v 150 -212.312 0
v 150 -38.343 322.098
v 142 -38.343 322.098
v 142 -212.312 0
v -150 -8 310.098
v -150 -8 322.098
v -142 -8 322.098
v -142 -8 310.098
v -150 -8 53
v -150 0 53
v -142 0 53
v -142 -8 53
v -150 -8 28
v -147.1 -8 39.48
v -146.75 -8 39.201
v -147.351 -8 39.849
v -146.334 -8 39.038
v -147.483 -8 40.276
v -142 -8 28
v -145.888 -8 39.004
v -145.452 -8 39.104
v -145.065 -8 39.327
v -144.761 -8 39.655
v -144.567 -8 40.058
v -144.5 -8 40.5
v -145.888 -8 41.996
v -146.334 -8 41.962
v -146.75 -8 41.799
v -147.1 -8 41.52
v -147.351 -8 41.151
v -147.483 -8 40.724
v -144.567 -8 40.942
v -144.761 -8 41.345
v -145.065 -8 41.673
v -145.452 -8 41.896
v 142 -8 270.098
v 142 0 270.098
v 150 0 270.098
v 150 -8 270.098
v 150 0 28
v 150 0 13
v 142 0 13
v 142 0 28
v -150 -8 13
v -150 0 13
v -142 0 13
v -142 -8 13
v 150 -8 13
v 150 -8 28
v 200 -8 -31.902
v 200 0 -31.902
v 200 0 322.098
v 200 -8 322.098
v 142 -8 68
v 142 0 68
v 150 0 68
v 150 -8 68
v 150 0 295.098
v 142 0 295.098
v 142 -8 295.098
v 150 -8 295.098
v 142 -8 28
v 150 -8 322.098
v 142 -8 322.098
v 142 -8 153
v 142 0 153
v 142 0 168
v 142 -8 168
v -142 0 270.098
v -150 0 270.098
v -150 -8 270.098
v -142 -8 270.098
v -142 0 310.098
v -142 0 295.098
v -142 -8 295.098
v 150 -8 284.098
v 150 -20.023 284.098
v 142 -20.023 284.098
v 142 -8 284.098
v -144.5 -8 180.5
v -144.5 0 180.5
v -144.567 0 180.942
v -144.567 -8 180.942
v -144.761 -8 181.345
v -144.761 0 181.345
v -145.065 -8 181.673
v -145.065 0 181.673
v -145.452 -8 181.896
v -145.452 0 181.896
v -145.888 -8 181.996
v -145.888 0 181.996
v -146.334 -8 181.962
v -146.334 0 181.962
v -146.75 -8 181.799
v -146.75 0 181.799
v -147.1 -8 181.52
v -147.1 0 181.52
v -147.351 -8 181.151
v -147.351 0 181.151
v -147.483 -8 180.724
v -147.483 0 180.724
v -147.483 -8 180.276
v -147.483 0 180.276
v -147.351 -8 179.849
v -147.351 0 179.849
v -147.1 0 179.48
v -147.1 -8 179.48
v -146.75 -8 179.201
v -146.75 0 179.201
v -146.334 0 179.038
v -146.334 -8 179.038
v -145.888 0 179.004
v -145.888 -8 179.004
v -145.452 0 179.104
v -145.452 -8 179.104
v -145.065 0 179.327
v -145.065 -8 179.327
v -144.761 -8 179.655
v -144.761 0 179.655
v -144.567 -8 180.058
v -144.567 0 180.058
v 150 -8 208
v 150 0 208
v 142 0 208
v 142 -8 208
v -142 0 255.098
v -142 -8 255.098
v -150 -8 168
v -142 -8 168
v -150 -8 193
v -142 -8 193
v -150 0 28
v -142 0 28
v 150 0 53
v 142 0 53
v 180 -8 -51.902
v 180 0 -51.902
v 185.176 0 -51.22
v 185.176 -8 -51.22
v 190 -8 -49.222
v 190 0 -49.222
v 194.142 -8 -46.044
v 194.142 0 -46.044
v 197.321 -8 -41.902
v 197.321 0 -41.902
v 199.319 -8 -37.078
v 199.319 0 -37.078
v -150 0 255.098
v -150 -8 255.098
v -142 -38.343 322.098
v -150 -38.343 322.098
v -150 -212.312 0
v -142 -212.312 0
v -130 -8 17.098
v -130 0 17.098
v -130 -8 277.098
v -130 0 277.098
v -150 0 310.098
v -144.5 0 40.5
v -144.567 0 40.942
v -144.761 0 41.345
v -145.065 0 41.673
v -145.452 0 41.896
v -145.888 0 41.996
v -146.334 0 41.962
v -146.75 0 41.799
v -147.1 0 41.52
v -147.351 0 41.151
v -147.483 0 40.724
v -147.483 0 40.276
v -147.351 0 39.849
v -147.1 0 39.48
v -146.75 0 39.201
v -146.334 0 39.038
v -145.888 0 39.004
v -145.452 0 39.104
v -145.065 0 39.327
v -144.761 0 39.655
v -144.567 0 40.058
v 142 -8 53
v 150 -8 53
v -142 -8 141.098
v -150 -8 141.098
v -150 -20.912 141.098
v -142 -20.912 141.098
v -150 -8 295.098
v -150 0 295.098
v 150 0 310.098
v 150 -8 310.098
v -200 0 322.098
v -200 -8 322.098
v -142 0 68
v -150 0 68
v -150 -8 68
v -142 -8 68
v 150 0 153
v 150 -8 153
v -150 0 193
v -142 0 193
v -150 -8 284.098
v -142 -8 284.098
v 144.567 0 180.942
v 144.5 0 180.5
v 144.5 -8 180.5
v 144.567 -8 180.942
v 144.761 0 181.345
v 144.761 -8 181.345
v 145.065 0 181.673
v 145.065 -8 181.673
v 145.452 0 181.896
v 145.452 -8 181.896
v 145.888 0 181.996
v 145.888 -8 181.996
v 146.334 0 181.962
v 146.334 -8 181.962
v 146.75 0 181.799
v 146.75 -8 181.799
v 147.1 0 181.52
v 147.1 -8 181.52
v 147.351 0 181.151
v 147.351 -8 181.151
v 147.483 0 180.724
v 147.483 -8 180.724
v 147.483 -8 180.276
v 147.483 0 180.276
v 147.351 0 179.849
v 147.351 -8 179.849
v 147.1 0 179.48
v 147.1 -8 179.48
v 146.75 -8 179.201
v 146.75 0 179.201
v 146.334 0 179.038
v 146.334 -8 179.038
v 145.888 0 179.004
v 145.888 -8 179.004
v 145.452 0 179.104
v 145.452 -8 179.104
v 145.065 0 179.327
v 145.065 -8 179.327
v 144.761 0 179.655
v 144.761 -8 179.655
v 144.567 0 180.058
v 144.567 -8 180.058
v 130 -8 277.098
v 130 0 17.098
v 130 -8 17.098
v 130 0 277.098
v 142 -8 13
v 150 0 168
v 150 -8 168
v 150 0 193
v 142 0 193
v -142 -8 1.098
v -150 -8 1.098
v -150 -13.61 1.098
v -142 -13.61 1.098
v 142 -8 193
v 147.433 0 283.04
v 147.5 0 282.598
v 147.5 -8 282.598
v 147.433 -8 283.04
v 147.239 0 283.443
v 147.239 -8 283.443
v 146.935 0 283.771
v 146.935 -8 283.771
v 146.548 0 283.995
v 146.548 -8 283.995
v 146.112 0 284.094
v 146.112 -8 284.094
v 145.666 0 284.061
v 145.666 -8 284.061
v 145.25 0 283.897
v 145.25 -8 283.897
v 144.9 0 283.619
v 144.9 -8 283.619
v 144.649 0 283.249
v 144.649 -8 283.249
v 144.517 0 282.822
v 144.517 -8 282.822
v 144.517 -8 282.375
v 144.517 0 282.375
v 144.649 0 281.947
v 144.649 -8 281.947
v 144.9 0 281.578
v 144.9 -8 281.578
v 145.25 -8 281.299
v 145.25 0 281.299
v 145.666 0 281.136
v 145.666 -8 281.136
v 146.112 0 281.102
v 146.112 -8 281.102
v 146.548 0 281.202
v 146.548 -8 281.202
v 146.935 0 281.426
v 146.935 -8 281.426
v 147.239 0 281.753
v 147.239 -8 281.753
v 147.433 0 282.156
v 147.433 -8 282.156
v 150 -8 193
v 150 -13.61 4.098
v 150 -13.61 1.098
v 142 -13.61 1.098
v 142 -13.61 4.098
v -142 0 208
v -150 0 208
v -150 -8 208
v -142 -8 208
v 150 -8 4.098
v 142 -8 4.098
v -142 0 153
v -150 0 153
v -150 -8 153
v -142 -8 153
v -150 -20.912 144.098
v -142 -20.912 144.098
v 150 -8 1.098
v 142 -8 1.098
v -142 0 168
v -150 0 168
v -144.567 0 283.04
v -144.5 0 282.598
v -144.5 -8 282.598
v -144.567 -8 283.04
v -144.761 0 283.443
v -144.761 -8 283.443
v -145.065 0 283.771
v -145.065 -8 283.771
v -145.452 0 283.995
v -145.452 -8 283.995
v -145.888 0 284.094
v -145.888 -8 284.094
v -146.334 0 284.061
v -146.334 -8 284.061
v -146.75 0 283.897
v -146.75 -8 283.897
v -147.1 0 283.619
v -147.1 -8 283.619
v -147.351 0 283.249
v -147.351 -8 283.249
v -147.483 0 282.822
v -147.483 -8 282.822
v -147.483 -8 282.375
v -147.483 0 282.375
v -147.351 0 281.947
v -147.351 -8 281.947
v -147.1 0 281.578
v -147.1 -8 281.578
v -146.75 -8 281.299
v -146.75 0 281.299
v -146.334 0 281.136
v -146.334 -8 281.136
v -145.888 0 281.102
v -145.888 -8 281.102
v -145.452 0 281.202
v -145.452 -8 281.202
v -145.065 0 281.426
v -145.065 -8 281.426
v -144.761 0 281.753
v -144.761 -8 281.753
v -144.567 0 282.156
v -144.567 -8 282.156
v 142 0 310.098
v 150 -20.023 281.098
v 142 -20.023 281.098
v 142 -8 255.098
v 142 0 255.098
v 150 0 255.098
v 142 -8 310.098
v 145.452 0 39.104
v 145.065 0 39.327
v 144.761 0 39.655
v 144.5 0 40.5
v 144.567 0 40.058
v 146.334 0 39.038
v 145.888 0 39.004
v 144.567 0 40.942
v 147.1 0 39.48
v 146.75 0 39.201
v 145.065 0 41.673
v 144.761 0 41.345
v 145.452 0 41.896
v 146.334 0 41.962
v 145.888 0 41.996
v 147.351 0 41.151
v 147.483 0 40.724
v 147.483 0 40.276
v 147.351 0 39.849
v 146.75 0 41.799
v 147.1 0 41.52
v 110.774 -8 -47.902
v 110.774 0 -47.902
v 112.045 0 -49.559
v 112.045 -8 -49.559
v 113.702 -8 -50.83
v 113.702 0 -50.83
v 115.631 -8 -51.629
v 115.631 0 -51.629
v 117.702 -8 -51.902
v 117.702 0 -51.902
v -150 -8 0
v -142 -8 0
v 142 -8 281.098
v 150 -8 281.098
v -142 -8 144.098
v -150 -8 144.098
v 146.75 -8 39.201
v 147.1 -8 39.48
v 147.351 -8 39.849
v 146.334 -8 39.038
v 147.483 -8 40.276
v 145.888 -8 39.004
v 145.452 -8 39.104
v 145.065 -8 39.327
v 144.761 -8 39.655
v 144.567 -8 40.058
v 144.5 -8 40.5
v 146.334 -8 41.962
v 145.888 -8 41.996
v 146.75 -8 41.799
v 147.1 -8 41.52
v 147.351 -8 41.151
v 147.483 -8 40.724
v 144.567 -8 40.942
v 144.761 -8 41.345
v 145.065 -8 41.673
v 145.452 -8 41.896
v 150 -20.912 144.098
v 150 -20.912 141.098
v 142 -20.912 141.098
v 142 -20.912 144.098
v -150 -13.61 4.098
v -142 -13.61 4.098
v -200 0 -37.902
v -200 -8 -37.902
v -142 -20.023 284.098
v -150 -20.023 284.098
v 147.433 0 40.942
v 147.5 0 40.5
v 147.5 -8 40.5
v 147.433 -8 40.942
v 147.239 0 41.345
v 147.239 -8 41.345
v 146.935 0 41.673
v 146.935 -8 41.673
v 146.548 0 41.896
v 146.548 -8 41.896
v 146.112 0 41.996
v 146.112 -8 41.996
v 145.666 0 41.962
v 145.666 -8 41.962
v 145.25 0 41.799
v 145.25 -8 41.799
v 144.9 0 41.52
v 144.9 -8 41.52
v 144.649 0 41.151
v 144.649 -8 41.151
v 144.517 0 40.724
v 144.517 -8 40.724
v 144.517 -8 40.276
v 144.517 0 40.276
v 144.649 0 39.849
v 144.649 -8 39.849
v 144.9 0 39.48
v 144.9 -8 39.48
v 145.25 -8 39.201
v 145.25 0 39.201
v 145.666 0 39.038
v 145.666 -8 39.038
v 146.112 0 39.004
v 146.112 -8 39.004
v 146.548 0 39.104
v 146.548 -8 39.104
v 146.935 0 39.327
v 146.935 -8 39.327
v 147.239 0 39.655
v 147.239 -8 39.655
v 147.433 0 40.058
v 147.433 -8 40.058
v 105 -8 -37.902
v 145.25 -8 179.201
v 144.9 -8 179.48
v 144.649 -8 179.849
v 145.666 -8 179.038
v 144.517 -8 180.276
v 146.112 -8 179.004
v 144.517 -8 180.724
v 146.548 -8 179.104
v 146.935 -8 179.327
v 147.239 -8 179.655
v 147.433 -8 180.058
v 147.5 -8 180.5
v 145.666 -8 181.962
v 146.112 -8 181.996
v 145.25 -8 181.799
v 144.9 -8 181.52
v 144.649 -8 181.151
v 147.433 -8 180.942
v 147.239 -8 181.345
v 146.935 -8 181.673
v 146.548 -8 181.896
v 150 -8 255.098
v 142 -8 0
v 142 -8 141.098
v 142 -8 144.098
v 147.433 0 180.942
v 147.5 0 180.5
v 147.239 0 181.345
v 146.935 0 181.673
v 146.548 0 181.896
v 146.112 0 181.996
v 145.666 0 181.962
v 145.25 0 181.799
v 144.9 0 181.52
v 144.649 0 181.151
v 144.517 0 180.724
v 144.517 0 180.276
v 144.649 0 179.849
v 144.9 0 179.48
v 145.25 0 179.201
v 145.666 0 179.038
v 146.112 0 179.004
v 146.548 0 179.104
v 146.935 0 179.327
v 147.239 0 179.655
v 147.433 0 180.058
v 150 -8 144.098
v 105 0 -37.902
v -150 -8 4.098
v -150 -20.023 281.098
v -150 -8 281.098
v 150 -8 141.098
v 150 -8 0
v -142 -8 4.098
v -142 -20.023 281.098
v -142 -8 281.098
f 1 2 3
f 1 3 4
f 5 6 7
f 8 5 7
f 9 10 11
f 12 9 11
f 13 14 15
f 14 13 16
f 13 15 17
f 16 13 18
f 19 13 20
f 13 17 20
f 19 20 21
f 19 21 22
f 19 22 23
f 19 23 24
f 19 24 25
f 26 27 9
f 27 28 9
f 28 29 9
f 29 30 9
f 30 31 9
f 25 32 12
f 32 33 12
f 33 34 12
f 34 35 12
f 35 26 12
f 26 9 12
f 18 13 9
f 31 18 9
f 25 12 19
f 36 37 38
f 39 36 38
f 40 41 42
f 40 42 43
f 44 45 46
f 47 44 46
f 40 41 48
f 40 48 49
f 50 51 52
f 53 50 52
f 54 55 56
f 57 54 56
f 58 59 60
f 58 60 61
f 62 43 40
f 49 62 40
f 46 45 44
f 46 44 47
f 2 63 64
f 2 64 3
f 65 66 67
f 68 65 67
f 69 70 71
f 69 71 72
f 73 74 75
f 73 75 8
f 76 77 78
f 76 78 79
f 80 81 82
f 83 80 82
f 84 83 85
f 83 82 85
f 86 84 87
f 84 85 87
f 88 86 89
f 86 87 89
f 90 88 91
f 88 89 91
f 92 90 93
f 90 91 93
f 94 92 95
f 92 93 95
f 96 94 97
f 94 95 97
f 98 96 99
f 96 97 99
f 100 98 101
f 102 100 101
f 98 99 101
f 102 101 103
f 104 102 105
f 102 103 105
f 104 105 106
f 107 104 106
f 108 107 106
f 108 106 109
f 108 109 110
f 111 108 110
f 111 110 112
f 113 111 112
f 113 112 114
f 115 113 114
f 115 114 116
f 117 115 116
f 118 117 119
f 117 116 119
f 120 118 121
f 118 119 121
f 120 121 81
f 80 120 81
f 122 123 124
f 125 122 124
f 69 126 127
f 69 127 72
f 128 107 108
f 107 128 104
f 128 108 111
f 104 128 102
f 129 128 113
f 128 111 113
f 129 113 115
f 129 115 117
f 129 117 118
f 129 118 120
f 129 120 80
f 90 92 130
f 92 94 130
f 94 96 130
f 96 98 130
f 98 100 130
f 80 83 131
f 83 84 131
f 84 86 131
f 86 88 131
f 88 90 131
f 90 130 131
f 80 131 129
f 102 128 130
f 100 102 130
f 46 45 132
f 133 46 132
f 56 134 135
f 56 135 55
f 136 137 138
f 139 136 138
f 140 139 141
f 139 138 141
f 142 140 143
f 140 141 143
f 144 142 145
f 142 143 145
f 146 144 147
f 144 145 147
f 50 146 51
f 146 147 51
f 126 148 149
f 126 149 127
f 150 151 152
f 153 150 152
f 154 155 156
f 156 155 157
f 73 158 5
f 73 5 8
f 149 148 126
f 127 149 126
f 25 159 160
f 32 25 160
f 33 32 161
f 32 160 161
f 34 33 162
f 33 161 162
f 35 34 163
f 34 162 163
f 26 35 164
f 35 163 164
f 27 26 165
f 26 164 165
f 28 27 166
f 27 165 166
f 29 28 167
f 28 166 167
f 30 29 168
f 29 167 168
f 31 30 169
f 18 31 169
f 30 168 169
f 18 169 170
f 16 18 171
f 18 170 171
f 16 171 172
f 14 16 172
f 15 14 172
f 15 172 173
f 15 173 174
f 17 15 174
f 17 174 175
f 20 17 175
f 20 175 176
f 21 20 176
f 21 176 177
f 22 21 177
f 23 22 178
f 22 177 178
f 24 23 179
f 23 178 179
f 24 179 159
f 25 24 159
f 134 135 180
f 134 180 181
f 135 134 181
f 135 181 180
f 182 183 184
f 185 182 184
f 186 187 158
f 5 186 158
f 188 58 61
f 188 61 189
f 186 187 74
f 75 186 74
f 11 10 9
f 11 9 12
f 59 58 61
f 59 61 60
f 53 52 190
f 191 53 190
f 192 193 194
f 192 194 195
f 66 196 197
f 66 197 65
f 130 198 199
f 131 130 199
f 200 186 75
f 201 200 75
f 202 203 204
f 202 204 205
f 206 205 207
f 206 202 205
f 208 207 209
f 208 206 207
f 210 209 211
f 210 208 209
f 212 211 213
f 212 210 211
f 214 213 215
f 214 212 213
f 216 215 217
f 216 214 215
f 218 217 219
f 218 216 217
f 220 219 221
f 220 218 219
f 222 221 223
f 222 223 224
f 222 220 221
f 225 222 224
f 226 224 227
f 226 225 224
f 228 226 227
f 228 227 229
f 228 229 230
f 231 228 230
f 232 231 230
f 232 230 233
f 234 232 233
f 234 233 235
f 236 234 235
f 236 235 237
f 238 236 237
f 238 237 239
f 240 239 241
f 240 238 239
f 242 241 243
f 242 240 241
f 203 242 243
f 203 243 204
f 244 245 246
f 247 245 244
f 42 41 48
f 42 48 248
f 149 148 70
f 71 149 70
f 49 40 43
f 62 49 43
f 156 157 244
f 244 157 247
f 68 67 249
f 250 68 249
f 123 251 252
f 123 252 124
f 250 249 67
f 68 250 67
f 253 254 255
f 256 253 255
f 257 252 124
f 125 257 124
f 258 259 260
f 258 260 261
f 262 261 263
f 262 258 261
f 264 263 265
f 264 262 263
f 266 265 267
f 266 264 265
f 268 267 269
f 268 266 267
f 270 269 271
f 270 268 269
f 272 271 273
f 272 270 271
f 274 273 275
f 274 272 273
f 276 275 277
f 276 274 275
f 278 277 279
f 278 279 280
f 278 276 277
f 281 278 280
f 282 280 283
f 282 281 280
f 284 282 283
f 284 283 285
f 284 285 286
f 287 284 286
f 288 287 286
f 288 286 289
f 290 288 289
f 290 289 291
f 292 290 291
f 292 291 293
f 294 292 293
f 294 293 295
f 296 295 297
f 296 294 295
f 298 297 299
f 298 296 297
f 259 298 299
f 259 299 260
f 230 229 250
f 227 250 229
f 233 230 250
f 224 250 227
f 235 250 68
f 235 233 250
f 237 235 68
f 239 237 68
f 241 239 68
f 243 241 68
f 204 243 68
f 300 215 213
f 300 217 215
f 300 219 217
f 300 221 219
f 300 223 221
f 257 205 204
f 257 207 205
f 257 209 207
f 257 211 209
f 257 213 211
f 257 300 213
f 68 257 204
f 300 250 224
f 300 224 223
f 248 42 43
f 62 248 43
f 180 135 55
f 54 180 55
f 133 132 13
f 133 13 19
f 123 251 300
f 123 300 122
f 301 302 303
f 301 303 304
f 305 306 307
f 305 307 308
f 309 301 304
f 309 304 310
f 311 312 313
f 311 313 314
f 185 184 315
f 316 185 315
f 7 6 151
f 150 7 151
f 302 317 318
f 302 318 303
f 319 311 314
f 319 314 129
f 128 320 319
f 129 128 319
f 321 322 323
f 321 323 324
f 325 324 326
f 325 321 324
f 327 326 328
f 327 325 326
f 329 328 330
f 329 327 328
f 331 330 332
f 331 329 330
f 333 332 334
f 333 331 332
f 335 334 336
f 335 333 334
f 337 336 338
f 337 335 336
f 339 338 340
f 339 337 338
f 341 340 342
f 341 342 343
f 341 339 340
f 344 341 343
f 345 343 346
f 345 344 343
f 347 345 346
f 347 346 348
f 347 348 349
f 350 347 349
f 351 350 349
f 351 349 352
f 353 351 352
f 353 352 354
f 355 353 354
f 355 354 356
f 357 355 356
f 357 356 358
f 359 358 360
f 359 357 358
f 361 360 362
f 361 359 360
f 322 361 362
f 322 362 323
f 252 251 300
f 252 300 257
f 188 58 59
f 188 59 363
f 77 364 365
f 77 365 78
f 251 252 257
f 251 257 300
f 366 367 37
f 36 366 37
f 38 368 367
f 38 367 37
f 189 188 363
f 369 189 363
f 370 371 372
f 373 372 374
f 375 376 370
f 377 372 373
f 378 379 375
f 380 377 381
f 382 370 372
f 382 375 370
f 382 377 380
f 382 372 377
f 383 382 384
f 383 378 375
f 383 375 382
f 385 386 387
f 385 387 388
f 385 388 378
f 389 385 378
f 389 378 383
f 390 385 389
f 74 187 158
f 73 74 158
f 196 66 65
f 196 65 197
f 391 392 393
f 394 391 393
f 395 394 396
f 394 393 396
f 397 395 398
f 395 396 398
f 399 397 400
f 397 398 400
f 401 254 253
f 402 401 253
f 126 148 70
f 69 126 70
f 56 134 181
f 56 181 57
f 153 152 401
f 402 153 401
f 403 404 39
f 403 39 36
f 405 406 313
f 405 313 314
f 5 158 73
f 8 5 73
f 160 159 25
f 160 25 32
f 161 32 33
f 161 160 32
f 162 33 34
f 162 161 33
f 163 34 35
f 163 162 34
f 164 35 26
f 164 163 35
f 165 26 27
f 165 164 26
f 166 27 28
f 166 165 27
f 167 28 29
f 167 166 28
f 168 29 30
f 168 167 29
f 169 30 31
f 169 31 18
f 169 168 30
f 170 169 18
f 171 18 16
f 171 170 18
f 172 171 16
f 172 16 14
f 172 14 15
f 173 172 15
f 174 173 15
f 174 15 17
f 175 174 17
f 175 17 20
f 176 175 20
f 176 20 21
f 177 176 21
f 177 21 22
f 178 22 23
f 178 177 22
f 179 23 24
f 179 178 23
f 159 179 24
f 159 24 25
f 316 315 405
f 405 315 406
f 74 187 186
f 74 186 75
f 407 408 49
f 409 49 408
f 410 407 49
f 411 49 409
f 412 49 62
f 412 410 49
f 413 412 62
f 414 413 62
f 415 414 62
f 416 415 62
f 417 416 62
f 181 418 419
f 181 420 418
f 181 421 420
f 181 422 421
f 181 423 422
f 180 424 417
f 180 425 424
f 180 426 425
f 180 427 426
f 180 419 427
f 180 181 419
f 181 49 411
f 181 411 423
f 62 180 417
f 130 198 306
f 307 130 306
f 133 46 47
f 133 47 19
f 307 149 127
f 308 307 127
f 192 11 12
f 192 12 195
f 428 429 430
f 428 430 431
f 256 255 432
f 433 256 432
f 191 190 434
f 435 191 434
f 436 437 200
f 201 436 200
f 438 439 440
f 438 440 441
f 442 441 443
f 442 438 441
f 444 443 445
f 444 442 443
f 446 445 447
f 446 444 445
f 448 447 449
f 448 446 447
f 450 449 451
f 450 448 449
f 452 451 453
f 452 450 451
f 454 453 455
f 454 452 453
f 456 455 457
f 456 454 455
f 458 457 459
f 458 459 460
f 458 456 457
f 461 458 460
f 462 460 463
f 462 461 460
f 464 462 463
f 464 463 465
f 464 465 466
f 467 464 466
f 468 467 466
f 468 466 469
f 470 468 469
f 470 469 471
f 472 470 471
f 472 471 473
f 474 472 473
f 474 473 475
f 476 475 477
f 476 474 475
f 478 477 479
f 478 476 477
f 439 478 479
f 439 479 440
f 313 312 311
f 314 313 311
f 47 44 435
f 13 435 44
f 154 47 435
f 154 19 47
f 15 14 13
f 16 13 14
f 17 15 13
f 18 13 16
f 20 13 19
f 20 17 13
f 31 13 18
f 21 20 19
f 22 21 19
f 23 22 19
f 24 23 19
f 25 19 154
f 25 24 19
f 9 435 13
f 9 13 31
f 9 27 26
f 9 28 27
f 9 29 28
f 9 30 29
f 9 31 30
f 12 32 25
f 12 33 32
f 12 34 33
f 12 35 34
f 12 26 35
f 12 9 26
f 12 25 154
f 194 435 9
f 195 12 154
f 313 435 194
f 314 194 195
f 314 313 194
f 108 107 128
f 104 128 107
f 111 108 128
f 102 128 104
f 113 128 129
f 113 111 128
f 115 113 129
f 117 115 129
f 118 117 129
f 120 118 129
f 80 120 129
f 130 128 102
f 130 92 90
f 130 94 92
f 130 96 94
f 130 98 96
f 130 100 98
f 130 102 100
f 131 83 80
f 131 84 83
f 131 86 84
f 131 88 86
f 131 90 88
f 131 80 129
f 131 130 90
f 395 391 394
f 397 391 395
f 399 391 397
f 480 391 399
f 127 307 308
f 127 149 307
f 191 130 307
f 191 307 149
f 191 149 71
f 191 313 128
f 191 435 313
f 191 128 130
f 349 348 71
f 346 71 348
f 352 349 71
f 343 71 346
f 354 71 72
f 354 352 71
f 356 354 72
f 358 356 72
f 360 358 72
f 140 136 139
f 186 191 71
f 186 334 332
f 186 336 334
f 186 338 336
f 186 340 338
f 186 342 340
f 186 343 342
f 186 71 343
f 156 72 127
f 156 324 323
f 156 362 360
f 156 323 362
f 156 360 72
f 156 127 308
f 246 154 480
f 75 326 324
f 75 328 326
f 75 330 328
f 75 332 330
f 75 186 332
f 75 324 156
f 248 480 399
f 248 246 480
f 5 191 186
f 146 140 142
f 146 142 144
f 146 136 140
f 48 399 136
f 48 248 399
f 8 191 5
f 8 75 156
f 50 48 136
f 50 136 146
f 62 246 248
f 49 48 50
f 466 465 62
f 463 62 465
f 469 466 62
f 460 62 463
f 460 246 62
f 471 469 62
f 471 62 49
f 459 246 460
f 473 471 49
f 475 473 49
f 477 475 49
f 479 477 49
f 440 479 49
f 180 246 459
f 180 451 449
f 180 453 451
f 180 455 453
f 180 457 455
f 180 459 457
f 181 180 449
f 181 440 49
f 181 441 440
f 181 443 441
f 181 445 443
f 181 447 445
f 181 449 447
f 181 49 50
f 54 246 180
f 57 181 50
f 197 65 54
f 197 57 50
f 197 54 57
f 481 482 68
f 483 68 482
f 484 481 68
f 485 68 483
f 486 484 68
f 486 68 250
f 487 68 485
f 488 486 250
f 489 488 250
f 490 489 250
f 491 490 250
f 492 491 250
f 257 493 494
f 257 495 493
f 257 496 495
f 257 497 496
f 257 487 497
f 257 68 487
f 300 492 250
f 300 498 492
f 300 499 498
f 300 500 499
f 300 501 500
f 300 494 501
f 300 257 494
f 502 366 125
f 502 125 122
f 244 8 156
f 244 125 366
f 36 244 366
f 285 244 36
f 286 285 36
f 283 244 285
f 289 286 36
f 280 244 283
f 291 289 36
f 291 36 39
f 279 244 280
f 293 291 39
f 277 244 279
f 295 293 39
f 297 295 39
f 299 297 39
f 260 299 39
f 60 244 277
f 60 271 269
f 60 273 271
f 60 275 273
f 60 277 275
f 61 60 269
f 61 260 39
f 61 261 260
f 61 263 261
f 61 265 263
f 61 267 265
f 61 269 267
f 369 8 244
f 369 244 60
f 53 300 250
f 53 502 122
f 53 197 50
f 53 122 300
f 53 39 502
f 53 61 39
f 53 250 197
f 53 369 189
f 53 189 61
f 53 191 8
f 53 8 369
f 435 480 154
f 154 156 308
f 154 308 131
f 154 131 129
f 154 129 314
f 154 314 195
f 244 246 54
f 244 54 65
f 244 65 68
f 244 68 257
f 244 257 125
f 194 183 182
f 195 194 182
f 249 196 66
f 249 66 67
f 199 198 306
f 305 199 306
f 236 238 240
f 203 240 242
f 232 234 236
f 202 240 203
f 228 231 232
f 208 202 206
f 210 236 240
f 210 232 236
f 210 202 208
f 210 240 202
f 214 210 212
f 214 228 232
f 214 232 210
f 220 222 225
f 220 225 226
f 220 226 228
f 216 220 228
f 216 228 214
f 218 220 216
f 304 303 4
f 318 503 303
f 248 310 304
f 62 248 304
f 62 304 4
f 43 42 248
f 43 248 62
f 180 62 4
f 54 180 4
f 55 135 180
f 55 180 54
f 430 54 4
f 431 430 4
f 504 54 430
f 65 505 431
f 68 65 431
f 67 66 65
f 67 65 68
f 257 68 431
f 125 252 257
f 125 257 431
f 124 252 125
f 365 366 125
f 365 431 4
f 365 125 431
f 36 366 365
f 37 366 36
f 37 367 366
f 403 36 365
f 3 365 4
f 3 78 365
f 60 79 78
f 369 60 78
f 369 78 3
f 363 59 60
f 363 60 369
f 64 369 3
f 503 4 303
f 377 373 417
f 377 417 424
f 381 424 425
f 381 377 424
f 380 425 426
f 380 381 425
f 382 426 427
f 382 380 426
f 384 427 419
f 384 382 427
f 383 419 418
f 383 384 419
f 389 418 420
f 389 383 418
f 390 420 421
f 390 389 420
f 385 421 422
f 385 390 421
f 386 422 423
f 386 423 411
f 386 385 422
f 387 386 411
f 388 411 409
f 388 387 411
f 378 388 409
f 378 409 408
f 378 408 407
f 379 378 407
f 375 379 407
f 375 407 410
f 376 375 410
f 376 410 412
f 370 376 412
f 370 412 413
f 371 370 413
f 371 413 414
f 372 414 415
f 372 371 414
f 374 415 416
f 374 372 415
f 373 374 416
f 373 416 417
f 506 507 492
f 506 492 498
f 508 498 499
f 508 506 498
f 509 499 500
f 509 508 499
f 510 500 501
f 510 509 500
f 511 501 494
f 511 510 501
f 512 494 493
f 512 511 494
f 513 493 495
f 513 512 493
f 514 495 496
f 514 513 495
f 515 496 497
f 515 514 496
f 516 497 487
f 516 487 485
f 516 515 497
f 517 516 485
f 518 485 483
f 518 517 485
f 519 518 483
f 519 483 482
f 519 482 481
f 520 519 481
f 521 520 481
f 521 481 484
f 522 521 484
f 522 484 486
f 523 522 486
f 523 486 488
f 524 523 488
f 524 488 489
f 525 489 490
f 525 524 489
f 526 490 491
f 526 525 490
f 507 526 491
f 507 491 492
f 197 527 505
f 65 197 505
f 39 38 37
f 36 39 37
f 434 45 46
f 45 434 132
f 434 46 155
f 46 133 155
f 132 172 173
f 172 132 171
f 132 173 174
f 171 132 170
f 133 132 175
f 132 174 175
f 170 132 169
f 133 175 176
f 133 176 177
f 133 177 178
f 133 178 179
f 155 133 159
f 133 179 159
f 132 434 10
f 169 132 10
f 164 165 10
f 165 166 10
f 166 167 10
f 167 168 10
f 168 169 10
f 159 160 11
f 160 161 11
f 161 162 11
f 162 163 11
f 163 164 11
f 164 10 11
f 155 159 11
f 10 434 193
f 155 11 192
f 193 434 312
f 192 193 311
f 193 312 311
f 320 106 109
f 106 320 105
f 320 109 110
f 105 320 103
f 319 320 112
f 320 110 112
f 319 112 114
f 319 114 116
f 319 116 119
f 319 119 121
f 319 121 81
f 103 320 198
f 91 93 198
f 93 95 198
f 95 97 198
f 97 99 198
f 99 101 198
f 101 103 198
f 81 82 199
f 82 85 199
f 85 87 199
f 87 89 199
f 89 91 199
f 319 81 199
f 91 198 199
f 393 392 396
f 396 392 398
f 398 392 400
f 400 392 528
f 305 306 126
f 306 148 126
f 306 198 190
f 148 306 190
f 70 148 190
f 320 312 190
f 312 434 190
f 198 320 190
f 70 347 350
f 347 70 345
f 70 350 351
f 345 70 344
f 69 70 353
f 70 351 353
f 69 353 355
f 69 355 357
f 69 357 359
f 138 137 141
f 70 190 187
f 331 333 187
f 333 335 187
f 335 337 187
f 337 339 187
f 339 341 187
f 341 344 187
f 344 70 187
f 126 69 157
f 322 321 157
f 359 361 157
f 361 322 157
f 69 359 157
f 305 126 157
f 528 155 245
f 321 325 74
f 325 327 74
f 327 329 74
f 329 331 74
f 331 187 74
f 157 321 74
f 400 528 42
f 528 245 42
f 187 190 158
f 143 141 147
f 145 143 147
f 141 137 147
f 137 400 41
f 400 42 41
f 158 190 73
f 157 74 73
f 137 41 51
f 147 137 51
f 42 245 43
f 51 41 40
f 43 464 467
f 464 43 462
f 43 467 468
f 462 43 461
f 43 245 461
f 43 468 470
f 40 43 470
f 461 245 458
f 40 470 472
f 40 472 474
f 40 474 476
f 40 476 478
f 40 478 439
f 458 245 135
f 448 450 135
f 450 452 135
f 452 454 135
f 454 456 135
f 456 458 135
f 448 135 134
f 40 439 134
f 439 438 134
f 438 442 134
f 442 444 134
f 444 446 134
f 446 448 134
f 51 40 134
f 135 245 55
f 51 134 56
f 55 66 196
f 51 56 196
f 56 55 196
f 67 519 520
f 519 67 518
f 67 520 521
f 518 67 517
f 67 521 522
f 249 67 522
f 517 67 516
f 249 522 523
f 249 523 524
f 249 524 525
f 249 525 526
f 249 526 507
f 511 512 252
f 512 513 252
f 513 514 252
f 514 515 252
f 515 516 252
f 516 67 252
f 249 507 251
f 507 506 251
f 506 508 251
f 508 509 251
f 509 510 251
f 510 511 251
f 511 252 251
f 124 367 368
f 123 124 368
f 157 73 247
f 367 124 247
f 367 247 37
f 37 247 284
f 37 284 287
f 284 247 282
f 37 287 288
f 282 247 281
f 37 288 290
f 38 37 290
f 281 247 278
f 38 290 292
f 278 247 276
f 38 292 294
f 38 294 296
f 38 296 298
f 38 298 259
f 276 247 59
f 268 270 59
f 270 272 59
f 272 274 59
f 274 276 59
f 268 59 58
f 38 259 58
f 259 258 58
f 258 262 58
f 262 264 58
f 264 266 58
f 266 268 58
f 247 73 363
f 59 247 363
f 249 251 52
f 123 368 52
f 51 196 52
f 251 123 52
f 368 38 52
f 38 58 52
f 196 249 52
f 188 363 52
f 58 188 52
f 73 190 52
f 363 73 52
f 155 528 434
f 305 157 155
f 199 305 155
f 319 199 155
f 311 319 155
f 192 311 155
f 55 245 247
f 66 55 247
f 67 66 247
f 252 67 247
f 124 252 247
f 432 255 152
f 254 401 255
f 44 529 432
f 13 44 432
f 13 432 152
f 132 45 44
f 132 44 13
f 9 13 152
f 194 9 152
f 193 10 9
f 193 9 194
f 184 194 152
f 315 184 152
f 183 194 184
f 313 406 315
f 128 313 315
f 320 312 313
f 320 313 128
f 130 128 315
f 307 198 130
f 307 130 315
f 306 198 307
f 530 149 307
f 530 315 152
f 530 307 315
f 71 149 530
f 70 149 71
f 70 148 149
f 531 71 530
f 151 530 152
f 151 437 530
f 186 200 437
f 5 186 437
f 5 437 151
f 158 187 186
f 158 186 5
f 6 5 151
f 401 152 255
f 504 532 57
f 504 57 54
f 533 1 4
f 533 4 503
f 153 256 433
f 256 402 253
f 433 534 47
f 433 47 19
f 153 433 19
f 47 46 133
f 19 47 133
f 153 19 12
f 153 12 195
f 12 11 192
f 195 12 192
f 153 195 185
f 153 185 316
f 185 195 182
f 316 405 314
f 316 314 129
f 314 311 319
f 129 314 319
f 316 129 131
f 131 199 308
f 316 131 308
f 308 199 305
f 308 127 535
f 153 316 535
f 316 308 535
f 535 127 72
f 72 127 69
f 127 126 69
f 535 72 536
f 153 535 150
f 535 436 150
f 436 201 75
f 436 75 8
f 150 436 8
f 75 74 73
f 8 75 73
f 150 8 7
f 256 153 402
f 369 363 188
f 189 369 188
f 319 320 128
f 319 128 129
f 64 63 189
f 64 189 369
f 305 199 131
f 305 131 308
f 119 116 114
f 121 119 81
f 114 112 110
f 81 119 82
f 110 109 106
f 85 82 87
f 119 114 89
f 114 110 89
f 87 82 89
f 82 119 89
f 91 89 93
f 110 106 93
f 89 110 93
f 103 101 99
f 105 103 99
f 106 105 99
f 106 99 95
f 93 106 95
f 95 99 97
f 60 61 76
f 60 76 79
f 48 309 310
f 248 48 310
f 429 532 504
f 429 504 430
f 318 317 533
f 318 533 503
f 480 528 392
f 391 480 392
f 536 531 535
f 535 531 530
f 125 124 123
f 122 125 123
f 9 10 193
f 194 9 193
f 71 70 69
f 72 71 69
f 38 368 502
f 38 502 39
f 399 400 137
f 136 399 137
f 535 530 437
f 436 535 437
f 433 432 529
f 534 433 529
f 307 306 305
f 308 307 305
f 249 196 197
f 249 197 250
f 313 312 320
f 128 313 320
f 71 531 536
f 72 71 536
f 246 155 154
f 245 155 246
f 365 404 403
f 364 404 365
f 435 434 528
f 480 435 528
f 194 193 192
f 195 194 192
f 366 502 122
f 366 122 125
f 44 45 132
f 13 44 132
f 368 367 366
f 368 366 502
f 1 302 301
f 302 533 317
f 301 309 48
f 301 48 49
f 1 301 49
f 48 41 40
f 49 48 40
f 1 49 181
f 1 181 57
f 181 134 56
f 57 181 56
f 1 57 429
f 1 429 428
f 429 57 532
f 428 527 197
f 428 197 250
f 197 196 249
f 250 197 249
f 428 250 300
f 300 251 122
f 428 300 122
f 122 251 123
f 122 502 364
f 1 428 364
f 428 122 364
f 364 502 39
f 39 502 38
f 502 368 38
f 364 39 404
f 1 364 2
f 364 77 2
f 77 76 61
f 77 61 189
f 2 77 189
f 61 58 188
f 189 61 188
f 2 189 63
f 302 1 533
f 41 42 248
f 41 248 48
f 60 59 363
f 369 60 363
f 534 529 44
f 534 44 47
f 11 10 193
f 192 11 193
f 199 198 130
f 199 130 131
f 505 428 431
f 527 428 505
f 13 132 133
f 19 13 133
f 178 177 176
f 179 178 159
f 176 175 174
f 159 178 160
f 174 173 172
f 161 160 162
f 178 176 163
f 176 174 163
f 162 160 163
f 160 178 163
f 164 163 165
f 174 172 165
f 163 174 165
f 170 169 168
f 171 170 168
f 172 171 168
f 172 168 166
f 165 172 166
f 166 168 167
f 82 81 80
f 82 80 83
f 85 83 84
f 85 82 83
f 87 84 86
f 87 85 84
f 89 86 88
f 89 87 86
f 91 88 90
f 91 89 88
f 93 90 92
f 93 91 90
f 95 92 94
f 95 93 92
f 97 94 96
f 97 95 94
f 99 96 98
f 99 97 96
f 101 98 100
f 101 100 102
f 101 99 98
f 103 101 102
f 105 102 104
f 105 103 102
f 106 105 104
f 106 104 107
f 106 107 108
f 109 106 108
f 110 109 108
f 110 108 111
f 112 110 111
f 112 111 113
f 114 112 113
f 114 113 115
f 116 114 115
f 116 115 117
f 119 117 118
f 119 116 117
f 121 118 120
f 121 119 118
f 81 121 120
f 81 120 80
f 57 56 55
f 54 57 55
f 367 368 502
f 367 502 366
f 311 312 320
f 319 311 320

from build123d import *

# Parameters (mm, degrees)
F0_W     = 8
F0_H     = 15
F0_R     = 1.5
F0_W_2   = 260
F0_H_2   = 260
F1_DEPTH = 8
F2_W     = 8
F2_H     = 15
F3_DEPTH = 8


with BuildPart() as f1:
    # F0 (on Front) → F1 (new body)
    with BuildSketch(Plane.XZ):
        with BuildLine():
            Line((200, 322.098305), (-200, 322.098305))
            Line((-200, 322.098305), (-200, -37.901695))
            Line((-200, -37.901695), (105, -37.901695))
            Line((105, -37.901695), (110.773503, -47.901695))
            ThreePointArc((110.773503, -47.901695), (113.701706, -50.829898), (117.701706, -51.901695))
            Line((117.701706, -51.901695), (180, -51.901695))
            ThreePointArc((180, -51.901695), (194.142136, -46.043831), (200, -31.901695))
            Line((200, -31.901695), (200, 322.098305))
        make_face()
        with Locations((-146, 20.5)):
            Rectangle(F0_W, F0_H, mode=Mode.SUBTRACT)
        with Locations((-146, 40.5)):
            Circle(F0_R, mode=Mode.SUBTRACT)
        with Locations((-146, 60.5)):
            Rectangle(F0_W, F0_H, mode=Mode.SUBTRACT)
        with Locations((146, 20.5)):
            Rectangle(F0_W, F0_H, mode=Mode.SUBTRACT)
        with Locations((146, 40.5)):
            Circle(F0_R, mode=Mode.SUBTRACT)
        with Locations((146, 60.5)):
            Rectangle(F0_W, F0_H, mode=Mode.SUBTRACT)
        with Locations((-146, 160.5)):
            Rectangle(F0_W, F0_H, mode=Mode.SUBTRACT)
        with Locations((-146, 180.5)):
            Circle(F0_R, mode=Mode.SUBTRACT)
        with Locations((-146, 200.5)):
            Rectangle(F0_W, F0_H, mode=Mode.SUBTRACT)
        with Locations((-146, 262.598305)):
            Rectangle(F0_W, F0_H, mode=Mode.SUBTRACT)
        with Locations((-146, 282.598305)):
            Circle(F0_R, mode=Mode.SUBTRACT)
        with Locations((-146, 302.598305)):
            Rectangle(F0_W, F0_H, mode=Mode.SUBTRACT)
        with Locations((0, 147.098305)):
            Rectangle(F0_W_2, F0_H_2, mode=Mode.SUBTRACT)
        with Locations((146, 160.5)):
            Rectangle(F0_W, F0_H, mode=Mode.SUBTRACT)
        with Locations((146, 180.5)):
            Circle(F0_R, mode=Mode.SUBTRACT)
        with Locations((146, 200.5)):
            Rectangle(F0_W, F0_H, mode=Mode.SUBTRACT)
        with Locations((146, 262.598305)):
            Rectangle(F0_W, F0_H, mode=Mode.SUBTRACT)
        with Locations((146, 282.598305)):
            Circle(F0_R, mode=Mode.SUBTRACT)
        with Locations((146, 302.598305)):
            Rectangle(F0_W, F0_H, mode=Mode.SUBTRACT)
    extrude(amount=F1_DEPTH)


with BuildPart() as f3:
    # F2 (on face) → F3 (new body)
    with BuildSketch(Plane.YZ.offset(-150)):
        Polygon((0, 284.098305), (0, 322.098305), (-38.343132, 322.098305), (-212.311924, 0), (0, 0), (0, 1.098305), (-13.610147, 1.098305), (-13.610147, 4.098305), (0, 4.098305), (0, 141.098305), (-20.911708, 141.098305), (-20.911708, 144.098305), (0, 144.098305), (0, 193), (-8, 193), (-8, 208), (0, 208), (0, 281.098305), (-20.023387, 281.098305), (-20.023387, 284.098305), align=None)
        with Locations((-4, 200.5)):
            Rectangle(F2_W, F2_H)
    extrude(amount=F3_DEPTH)

    # F4: cut F1
    add(f1.part, mode=Mode.SUBTRACT)


with BuildPart() as f5_1:
    # F5: instance of F3
    add(f3.part.mirror(Plane.YZ))


solid = Compound([f1.part, f3.part, f5_1.part])
